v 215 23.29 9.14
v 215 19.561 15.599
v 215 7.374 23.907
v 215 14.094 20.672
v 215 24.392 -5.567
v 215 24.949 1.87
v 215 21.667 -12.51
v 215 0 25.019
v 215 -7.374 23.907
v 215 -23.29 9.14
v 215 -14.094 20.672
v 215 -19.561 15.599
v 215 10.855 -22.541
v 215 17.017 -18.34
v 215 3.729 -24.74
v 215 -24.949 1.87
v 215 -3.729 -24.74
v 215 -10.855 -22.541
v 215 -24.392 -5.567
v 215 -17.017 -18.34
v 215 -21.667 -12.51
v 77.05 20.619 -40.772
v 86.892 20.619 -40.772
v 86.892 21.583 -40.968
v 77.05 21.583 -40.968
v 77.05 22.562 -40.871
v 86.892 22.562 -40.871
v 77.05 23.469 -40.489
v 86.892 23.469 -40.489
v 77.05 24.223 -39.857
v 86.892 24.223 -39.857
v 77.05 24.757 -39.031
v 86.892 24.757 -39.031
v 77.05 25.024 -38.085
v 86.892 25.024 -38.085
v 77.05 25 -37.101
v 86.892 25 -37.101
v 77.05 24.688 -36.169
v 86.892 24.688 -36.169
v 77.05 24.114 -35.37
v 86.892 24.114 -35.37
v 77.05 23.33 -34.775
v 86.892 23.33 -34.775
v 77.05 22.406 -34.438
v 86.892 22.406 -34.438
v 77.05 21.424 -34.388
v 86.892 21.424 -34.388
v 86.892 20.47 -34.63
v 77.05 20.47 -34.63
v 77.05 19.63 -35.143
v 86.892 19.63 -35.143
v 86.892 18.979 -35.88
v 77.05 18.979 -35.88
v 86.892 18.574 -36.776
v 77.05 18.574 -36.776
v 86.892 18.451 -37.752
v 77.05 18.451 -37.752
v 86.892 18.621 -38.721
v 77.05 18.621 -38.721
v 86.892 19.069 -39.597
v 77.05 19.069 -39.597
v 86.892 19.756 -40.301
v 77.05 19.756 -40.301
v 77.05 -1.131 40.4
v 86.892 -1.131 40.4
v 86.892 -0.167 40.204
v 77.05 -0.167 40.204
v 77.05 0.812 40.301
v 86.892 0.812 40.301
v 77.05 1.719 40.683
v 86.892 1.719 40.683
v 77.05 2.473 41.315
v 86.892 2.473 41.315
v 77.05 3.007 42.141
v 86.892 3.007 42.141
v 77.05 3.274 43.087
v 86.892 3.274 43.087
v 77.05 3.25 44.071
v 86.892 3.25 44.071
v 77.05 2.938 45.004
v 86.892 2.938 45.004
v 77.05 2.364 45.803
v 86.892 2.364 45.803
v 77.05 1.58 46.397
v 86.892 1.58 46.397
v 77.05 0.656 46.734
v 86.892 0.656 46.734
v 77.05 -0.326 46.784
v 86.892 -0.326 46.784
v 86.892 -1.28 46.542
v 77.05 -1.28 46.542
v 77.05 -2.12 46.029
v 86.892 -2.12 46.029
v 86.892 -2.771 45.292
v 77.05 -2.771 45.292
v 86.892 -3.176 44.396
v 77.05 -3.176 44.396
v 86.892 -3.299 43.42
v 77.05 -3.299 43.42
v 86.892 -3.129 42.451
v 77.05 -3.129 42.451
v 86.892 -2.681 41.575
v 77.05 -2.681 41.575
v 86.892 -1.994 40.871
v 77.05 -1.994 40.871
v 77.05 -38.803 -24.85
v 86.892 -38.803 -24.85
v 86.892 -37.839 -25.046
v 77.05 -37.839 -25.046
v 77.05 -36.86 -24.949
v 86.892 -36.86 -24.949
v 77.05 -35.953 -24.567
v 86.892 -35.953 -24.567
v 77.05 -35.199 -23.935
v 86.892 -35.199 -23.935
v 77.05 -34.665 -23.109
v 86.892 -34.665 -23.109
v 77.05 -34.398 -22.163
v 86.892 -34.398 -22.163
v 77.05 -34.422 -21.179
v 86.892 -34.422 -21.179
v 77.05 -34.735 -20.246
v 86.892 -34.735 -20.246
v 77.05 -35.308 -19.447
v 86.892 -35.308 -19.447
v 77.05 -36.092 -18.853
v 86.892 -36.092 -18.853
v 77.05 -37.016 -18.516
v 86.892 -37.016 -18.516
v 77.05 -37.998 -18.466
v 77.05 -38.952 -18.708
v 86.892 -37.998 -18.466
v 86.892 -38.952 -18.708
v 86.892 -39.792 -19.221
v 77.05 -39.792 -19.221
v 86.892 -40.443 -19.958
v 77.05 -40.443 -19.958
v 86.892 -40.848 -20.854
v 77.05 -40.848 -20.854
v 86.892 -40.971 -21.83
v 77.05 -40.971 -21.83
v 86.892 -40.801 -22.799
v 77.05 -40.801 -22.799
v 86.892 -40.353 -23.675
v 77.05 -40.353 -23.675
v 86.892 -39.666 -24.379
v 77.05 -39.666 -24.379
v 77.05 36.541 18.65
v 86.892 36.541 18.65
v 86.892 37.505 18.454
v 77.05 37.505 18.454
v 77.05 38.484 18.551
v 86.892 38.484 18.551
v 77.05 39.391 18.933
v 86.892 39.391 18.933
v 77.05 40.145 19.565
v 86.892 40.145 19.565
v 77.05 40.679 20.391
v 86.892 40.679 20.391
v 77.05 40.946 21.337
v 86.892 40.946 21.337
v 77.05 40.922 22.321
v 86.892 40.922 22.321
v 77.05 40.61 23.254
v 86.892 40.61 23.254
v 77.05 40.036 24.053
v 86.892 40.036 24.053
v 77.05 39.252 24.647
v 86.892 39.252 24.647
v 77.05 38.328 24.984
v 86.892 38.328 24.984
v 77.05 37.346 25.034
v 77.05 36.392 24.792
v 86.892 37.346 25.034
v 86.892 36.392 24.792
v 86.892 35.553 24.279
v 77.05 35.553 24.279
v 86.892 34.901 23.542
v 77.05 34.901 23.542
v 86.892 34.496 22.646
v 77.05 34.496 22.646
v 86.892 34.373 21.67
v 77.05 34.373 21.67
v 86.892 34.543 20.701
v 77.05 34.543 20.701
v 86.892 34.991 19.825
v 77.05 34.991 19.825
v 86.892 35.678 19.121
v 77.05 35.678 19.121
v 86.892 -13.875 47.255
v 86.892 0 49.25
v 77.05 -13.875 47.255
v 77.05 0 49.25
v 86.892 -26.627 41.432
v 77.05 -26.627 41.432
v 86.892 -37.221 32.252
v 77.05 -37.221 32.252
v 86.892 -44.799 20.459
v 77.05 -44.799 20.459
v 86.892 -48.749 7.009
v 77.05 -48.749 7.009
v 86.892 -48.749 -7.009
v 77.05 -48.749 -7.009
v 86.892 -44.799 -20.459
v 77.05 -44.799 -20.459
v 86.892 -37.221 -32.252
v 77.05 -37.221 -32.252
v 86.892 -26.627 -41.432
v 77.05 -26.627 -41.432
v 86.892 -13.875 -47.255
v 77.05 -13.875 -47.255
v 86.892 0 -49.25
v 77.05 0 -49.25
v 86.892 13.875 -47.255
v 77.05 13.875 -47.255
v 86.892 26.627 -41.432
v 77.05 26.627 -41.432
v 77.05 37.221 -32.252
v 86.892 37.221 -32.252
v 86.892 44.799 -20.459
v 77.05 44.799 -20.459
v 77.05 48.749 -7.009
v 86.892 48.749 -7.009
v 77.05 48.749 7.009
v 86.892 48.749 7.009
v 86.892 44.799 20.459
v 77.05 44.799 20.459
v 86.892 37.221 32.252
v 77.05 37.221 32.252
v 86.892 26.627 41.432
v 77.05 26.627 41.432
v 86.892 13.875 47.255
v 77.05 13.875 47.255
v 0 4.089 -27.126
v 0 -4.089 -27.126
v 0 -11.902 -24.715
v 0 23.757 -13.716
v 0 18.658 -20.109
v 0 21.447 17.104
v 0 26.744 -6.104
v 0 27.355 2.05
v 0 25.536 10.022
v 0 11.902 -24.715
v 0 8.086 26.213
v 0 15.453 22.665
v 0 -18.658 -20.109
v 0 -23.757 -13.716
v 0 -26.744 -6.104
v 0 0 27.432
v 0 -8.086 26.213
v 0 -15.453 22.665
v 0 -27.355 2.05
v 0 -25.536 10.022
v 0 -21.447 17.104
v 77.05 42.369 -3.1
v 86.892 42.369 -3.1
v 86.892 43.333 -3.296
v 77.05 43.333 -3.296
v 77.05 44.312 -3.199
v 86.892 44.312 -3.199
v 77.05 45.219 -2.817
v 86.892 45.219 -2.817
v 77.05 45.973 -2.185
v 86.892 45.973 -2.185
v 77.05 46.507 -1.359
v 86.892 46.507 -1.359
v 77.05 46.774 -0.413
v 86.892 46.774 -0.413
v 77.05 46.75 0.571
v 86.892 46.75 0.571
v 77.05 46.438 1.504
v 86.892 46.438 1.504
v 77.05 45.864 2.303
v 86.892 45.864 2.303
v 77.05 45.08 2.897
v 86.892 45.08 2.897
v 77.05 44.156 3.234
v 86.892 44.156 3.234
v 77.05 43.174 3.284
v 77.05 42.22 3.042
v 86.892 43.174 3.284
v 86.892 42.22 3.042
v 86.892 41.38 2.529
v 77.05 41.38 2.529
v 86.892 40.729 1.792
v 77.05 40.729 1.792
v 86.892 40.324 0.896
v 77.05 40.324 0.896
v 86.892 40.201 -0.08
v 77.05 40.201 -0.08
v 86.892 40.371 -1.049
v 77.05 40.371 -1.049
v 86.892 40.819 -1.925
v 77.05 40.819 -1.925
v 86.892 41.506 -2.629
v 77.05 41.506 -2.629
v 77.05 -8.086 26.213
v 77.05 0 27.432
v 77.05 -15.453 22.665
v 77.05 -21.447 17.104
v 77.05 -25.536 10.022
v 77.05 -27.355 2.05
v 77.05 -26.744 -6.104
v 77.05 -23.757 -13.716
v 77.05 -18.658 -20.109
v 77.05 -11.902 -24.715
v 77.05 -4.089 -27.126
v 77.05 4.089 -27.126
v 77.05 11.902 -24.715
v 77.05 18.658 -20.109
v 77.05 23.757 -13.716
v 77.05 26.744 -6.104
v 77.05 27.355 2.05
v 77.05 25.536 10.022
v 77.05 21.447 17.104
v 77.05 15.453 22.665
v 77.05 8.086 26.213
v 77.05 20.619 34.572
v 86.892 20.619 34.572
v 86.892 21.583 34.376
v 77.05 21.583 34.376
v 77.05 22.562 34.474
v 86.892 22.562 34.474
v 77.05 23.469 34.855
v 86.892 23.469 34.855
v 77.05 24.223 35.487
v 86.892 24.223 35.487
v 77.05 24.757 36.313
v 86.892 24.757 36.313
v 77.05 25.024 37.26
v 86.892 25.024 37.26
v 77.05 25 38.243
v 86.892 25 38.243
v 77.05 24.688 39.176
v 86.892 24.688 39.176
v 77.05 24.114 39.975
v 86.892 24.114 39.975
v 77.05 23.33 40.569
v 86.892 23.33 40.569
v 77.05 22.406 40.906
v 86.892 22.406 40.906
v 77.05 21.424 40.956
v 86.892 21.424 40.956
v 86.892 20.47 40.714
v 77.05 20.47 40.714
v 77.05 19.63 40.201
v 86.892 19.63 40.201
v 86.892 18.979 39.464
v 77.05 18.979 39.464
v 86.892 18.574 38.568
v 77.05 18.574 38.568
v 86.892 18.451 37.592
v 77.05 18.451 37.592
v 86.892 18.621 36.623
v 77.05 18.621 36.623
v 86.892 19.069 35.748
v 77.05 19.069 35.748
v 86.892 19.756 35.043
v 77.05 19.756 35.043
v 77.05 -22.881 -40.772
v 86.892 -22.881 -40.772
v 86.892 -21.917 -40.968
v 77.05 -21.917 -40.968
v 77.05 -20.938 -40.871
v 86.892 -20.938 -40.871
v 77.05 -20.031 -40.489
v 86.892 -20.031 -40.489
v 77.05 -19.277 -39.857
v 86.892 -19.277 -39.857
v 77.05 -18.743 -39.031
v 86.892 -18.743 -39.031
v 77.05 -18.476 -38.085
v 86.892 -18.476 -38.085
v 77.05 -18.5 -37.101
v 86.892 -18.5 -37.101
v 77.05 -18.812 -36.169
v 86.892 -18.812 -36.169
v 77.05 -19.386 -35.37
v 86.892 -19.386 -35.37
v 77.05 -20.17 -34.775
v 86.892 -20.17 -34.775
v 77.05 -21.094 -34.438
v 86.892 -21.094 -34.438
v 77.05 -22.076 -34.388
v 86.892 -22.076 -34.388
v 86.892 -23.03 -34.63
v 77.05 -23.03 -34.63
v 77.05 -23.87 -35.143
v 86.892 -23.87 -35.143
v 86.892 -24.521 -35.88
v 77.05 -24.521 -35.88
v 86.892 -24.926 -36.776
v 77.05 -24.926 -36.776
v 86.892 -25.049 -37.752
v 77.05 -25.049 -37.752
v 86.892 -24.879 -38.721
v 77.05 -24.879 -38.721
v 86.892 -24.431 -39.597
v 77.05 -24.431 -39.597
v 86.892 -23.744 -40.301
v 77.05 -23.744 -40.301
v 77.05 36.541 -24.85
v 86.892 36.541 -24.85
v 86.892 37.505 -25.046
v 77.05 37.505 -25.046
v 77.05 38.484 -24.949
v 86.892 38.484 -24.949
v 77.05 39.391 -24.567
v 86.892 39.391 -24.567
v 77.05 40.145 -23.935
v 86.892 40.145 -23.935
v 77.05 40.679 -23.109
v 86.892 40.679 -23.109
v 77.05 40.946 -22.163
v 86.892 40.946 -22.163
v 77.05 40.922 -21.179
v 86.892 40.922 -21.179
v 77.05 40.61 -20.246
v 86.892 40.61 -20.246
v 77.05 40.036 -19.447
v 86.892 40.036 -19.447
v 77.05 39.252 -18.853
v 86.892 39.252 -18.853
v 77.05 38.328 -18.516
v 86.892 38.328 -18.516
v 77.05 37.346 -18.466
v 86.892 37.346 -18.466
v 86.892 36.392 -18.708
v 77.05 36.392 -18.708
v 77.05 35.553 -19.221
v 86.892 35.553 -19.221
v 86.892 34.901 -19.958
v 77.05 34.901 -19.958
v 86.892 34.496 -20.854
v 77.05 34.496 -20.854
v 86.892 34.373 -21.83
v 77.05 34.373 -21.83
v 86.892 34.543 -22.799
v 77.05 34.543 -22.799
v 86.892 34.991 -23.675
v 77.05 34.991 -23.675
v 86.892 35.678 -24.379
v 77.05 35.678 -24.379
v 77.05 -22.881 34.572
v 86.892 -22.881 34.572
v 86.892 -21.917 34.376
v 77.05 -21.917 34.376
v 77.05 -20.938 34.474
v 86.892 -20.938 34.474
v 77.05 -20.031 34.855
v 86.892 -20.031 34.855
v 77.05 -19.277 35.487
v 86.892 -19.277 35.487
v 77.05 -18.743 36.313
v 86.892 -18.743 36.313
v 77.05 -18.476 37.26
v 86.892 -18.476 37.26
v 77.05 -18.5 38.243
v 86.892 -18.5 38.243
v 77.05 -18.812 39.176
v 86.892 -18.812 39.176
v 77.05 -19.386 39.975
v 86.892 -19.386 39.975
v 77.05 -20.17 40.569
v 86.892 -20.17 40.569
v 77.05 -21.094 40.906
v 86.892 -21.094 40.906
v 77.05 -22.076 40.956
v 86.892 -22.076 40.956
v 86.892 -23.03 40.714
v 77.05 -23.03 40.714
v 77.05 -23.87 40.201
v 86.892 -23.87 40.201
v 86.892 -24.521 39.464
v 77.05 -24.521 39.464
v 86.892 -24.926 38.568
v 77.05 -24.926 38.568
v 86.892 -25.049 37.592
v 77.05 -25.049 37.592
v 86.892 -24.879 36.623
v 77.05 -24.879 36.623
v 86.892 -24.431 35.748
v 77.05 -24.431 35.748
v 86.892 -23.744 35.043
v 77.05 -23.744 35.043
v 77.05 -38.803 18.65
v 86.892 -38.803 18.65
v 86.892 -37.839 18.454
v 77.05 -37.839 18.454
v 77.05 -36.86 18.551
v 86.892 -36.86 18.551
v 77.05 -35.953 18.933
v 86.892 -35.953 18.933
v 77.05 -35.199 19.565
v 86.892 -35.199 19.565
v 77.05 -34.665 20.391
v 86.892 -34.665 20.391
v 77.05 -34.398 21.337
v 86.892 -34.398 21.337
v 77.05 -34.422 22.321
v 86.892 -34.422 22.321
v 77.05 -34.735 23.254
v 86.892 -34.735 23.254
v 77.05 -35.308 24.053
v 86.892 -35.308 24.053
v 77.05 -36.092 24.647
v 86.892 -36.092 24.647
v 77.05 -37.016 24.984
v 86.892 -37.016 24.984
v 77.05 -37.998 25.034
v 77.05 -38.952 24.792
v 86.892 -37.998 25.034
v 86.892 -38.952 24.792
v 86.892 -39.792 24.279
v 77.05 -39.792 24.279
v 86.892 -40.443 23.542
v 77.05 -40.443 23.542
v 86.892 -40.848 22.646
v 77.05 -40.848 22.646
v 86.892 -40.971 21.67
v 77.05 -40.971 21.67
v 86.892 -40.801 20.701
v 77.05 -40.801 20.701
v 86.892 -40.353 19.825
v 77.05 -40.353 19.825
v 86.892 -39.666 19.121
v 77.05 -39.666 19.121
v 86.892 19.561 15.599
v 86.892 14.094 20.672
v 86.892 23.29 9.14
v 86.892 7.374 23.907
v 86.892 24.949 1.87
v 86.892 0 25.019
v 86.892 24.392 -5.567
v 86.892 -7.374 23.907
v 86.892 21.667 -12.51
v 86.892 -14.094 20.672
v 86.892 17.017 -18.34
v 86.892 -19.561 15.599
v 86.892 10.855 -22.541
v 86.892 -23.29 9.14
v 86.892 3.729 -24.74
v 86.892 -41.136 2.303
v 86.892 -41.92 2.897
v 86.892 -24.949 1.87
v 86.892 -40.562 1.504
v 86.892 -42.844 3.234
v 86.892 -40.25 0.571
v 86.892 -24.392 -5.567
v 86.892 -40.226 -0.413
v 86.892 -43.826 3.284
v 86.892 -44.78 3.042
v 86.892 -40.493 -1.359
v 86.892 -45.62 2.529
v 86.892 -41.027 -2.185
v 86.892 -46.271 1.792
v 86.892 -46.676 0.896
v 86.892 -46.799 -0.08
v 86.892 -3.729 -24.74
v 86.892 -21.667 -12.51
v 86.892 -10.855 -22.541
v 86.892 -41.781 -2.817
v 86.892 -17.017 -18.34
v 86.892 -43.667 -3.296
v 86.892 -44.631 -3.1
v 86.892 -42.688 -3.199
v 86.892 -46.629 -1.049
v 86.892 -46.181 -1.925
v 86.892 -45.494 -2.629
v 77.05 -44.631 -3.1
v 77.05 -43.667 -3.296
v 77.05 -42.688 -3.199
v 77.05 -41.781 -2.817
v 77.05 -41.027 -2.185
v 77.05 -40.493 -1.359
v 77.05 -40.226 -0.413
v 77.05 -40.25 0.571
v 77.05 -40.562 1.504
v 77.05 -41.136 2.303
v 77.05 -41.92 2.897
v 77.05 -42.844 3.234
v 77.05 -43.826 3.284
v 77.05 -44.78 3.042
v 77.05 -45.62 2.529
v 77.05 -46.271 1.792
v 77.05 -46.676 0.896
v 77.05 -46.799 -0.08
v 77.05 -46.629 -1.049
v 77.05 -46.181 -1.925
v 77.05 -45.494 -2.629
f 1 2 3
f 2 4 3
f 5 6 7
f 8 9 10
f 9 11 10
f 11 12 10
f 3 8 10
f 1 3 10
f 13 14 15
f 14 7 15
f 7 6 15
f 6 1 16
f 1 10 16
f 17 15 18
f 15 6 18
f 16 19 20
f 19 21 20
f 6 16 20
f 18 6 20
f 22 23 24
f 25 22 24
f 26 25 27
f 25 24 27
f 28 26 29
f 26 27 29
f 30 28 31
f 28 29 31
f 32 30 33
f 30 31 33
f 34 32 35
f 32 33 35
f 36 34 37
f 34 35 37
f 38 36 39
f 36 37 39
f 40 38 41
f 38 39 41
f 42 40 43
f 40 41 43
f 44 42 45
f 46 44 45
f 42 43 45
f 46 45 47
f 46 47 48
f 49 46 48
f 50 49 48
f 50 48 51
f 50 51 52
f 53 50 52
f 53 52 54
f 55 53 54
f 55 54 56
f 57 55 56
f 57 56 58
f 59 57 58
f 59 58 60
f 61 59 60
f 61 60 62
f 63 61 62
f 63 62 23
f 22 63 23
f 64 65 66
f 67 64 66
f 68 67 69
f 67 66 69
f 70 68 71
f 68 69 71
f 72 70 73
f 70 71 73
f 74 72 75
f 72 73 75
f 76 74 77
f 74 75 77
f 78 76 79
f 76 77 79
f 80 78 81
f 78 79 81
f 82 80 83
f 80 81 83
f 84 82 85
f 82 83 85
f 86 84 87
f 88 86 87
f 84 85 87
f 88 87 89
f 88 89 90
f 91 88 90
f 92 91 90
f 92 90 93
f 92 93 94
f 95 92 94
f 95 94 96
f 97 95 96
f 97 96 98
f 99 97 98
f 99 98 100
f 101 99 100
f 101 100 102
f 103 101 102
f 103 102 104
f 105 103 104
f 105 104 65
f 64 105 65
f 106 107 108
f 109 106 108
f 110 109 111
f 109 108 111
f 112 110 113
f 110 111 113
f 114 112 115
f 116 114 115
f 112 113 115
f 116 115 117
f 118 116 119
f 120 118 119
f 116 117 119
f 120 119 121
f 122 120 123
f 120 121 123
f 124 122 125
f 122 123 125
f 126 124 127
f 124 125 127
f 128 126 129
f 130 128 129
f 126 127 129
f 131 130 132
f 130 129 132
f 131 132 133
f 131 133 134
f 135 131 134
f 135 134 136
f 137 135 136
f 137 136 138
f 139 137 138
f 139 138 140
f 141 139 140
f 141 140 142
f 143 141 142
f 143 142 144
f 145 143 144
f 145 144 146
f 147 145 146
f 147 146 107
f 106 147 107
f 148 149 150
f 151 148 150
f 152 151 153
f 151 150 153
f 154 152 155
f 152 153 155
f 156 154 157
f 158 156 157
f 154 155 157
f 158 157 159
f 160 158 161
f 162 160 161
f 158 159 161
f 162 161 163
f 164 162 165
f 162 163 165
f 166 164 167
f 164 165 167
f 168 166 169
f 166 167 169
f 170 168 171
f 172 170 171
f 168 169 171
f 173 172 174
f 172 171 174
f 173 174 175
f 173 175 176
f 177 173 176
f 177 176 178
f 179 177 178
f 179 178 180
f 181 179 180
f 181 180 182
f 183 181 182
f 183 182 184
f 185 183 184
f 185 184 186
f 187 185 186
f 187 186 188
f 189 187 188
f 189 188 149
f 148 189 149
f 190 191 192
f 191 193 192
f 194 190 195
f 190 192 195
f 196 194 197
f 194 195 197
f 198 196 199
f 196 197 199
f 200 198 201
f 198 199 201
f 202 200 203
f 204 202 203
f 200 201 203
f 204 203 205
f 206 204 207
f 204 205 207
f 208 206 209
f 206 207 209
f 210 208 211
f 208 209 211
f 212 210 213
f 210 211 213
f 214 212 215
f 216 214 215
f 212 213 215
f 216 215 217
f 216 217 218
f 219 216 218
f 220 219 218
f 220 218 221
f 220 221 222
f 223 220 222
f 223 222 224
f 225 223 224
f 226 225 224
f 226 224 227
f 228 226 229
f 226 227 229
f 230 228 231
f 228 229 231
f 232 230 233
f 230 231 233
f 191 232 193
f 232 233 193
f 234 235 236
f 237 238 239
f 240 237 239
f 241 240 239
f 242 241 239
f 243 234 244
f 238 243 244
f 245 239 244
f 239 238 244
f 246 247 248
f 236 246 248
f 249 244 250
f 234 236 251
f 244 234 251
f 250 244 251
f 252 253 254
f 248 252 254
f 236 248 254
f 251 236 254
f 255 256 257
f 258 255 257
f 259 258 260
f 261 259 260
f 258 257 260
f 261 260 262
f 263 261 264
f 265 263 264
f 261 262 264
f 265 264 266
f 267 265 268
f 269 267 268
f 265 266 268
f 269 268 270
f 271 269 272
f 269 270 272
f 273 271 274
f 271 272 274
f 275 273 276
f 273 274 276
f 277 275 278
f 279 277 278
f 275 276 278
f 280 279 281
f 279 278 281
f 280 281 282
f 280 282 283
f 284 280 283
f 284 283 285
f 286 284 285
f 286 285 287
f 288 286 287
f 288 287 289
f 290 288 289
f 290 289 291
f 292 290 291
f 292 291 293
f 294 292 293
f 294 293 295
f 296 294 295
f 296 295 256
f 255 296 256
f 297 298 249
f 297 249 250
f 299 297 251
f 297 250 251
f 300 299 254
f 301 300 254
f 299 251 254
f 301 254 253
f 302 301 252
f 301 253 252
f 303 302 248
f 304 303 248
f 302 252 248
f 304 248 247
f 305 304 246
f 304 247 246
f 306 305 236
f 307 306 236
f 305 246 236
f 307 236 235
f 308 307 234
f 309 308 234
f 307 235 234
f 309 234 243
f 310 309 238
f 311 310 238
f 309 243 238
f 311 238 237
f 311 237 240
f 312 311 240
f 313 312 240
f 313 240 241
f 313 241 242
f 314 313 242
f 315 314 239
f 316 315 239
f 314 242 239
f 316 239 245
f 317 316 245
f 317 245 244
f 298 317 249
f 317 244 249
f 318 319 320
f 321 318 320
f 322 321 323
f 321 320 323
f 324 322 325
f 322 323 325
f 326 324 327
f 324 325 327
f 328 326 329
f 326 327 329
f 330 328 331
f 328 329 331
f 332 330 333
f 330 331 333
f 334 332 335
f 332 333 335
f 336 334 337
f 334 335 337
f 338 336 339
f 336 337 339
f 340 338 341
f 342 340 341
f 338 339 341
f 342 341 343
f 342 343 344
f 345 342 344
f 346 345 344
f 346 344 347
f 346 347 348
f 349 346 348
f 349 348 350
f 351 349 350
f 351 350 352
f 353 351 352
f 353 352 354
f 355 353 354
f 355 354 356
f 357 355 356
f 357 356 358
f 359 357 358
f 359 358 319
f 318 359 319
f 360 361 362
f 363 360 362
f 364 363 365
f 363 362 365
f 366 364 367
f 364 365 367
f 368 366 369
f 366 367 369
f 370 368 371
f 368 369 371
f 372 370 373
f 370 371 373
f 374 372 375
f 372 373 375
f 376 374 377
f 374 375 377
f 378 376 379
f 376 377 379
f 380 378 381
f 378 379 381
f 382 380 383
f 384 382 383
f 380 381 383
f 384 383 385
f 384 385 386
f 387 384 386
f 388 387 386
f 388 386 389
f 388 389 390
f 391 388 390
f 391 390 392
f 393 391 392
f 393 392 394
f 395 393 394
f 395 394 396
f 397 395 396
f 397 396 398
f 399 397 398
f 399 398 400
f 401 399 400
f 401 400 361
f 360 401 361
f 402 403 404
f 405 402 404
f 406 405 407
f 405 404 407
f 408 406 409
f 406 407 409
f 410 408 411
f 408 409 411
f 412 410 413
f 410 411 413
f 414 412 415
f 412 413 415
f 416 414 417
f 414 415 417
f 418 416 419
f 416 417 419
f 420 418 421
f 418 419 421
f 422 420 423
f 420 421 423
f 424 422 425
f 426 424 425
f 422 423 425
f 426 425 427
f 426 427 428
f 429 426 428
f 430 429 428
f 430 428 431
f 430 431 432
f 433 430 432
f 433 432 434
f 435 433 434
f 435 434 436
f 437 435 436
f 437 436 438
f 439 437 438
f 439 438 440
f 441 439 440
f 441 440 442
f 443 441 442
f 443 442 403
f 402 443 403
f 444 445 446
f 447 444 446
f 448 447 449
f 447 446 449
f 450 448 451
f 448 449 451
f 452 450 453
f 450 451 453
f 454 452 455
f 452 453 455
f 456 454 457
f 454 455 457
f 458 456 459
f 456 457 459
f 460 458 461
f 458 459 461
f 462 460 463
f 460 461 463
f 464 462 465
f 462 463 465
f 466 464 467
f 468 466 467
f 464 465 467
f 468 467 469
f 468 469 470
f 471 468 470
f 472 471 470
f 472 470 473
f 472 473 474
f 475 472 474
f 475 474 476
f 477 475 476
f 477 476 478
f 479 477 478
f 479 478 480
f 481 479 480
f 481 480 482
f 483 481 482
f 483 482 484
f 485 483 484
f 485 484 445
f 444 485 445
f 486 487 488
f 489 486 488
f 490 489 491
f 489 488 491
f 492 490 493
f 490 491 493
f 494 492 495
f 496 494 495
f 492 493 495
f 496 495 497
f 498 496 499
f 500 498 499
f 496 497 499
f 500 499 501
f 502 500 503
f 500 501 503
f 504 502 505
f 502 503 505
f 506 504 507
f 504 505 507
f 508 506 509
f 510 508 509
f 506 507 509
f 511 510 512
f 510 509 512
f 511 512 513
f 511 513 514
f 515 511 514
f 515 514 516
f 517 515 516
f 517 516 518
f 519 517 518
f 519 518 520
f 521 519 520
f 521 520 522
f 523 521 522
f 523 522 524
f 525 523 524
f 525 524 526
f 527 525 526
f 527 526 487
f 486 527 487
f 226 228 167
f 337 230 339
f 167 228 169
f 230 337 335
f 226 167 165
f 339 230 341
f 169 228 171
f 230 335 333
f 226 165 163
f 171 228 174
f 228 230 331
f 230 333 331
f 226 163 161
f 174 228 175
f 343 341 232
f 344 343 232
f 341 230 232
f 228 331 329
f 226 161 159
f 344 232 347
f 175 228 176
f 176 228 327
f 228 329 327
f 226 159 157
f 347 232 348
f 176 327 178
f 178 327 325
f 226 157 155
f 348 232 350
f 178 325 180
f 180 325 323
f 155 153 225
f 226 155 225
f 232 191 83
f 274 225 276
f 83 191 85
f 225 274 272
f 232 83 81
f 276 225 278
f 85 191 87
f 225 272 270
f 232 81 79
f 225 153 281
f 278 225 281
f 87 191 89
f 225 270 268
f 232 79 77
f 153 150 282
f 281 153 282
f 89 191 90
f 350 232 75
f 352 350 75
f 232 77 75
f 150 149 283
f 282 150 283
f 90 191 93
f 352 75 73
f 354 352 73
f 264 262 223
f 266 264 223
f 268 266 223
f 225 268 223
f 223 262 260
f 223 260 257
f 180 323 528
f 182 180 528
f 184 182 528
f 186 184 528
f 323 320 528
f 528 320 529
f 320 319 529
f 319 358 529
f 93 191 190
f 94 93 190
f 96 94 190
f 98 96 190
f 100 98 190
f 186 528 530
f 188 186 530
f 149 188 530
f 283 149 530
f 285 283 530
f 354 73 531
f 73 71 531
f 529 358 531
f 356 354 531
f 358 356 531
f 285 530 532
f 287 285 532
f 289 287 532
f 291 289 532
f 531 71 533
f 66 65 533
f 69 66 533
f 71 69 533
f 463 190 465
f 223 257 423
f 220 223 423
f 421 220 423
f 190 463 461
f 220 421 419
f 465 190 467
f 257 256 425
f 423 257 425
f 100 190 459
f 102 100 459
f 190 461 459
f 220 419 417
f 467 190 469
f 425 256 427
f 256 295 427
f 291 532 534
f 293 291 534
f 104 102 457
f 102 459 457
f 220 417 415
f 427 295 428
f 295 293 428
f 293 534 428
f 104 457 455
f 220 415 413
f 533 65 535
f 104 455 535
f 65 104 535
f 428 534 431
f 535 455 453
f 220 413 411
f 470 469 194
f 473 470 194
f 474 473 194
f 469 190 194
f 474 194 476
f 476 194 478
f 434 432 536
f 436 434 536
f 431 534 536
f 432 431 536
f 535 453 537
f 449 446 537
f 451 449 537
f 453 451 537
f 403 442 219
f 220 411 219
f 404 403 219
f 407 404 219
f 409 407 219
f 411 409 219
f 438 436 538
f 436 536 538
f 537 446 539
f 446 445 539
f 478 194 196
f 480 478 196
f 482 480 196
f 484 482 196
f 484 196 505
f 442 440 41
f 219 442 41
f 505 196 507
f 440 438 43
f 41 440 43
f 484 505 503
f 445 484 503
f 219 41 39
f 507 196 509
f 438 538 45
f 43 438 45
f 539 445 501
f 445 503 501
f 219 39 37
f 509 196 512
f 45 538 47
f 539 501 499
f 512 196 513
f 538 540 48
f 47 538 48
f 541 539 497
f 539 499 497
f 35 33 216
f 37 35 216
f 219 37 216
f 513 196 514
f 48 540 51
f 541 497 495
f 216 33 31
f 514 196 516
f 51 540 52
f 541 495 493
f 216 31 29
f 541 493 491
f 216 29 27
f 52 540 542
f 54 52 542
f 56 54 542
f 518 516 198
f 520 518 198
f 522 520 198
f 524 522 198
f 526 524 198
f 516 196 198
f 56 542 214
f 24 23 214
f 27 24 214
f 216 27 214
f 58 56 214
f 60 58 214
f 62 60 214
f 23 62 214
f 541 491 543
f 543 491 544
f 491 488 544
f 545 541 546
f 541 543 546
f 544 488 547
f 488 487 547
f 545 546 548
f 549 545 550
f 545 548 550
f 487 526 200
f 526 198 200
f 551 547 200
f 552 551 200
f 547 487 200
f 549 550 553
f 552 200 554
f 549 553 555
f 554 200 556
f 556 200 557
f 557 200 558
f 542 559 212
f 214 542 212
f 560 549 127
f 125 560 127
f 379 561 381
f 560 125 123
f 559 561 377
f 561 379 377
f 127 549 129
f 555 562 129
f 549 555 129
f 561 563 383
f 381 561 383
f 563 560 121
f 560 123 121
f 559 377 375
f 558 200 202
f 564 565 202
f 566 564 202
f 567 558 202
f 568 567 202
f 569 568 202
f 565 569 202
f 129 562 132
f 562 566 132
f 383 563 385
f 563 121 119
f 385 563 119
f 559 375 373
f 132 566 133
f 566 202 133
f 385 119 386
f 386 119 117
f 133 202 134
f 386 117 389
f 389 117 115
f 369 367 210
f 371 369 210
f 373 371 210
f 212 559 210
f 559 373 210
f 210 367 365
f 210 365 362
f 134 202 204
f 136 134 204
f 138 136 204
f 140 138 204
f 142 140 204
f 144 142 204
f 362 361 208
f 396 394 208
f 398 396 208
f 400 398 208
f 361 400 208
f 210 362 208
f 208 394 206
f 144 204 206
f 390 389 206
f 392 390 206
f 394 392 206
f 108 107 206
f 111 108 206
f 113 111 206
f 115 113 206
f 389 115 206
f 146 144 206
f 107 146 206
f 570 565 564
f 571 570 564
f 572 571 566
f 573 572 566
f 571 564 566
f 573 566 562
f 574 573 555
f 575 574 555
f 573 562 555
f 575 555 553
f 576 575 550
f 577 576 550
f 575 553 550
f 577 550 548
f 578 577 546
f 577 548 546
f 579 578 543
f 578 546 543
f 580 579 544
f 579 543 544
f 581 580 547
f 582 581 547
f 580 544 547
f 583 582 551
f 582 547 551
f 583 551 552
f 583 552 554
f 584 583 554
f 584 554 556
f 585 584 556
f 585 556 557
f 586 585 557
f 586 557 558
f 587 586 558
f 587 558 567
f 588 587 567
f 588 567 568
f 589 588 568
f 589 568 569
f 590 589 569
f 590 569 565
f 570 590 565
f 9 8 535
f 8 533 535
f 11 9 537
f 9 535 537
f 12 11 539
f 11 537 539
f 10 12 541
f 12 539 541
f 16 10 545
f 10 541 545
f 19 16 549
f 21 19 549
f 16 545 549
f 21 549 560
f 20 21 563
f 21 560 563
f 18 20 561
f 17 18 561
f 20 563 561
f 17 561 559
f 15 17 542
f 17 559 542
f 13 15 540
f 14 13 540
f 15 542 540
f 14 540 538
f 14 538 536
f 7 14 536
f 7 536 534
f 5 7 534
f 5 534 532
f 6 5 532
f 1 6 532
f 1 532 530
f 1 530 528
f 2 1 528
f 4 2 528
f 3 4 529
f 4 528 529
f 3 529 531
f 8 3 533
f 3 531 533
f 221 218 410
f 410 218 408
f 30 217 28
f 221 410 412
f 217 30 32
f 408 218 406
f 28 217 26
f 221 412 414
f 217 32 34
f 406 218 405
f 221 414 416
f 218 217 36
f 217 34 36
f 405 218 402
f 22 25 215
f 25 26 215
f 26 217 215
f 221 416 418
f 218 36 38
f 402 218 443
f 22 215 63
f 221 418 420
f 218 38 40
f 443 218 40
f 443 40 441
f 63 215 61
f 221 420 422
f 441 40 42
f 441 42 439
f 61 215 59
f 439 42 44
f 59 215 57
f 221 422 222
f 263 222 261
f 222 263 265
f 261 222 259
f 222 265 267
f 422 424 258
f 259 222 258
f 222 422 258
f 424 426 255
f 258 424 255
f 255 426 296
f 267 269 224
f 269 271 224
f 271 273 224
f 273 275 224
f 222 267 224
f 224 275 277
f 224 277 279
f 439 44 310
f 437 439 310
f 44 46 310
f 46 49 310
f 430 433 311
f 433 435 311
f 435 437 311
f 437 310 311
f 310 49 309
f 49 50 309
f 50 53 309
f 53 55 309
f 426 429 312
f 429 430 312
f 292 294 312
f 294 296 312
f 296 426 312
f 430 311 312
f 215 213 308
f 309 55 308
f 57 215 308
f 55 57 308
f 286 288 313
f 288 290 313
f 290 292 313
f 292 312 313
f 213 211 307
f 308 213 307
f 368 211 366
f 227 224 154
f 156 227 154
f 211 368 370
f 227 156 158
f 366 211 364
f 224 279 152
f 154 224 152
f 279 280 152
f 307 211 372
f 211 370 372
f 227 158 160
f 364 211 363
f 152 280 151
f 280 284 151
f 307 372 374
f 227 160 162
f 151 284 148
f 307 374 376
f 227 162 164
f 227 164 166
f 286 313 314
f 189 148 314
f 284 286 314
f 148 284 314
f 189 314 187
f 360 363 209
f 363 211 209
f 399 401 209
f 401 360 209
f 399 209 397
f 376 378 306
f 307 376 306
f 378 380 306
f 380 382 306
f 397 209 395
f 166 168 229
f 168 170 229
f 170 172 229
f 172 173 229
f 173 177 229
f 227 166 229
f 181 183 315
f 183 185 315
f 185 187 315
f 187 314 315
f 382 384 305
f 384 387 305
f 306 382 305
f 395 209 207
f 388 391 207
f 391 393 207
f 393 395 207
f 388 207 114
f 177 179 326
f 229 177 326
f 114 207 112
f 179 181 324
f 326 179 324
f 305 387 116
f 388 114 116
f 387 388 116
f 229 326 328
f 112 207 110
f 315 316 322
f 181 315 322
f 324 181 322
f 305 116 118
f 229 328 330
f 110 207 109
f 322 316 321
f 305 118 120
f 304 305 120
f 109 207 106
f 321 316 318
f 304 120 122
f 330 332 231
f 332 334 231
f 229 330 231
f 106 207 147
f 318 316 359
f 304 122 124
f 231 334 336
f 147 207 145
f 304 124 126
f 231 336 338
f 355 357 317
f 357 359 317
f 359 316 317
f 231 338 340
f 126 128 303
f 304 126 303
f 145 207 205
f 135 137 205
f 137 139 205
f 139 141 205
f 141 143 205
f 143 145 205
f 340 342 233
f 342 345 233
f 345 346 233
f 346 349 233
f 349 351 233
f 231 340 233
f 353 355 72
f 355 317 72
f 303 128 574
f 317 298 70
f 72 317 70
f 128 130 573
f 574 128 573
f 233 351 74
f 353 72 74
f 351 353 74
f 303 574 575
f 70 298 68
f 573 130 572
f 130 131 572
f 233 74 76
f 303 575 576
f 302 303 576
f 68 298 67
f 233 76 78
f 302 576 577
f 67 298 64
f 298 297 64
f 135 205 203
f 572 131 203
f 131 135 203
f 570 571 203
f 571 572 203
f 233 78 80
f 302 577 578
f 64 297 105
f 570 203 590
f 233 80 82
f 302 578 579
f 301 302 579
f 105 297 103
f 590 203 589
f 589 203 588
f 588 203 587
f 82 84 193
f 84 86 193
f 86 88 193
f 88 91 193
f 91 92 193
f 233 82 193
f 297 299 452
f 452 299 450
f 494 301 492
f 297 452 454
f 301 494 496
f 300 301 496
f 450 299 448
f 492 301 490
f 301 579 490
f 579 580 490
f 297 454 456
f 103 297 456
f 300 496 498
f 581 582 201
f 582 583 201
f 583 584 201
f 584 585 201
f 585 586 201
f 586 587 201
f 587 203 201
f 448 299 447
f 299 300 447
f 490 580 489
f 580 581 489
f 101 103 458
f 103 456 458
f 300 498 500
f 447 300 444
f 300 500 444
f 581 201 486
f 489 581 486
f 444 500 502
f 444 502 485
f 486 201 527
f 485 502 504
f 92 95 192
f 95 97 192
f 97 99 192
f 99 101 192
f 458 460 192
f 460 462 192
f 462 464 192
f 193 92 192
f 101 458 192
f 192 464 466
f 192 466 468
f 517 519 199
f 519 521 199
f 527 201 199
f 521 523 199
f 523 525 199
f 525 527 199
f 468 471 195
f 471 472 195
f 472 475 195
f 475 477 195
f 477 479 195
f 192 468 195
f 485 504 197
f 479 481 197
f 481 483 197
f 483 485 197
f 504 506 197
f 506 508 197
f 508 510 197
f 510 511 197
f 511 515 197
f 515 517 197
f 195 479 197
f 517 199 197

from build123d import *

# Parameters (mm, degrees)
M6_CLEARANCE_HOLE1_D = 6.6


with BuildPart() as part:
    # Sketch1 → Revolve1 (revolve)
    with BuildSketch(Plane(origin=(0, 0, 0), x_dir=(1, 0, 0), z_dir=(0, 1, 0)), mode=Mode.PRIVATE) as revolve1_sk:
        Polygon((0, 0), (215, 0), (215, 25.019), (148.198, 25.019), (86.8925, 25.019), (86.8925, 49.25), (77.05, 49.25), (77.05, 27.432), (0, 27.432), align=None)
    revolve(revolve1_sk.sketch.rotate(Axis((0, 0, 0), (1, 0, 0)), 180), axis=Axis((0, 0, 0), (1, 0, 0)))

    # M6 Clearance Hole1 (through all)
    with Locations(Plane(origin=(77.05, -25.41686526, -173.860891127), x_dir=(0, 0.3426508024612423, 0.9394628399104814), z_dir=(-1, 0, 0))):
        with Locations((129.200757828, -43.220313279), (138.703261819, -63.634261455), (157.139645763, -76.562007172), (179.56989547, -78.539571404), (199.983843646, -69.037067413), (212.911589362, -50.60068347), (214.889153595, -28.170433763), (205.386649604, -7.756485587), (186.95026566, 5.17126013), (164.520015953, 7.148824362), (144.106067777, -2.353679629)):
            Hole(M6_CLEARANCE_HOLE1_D / 2)


solid = part.part
